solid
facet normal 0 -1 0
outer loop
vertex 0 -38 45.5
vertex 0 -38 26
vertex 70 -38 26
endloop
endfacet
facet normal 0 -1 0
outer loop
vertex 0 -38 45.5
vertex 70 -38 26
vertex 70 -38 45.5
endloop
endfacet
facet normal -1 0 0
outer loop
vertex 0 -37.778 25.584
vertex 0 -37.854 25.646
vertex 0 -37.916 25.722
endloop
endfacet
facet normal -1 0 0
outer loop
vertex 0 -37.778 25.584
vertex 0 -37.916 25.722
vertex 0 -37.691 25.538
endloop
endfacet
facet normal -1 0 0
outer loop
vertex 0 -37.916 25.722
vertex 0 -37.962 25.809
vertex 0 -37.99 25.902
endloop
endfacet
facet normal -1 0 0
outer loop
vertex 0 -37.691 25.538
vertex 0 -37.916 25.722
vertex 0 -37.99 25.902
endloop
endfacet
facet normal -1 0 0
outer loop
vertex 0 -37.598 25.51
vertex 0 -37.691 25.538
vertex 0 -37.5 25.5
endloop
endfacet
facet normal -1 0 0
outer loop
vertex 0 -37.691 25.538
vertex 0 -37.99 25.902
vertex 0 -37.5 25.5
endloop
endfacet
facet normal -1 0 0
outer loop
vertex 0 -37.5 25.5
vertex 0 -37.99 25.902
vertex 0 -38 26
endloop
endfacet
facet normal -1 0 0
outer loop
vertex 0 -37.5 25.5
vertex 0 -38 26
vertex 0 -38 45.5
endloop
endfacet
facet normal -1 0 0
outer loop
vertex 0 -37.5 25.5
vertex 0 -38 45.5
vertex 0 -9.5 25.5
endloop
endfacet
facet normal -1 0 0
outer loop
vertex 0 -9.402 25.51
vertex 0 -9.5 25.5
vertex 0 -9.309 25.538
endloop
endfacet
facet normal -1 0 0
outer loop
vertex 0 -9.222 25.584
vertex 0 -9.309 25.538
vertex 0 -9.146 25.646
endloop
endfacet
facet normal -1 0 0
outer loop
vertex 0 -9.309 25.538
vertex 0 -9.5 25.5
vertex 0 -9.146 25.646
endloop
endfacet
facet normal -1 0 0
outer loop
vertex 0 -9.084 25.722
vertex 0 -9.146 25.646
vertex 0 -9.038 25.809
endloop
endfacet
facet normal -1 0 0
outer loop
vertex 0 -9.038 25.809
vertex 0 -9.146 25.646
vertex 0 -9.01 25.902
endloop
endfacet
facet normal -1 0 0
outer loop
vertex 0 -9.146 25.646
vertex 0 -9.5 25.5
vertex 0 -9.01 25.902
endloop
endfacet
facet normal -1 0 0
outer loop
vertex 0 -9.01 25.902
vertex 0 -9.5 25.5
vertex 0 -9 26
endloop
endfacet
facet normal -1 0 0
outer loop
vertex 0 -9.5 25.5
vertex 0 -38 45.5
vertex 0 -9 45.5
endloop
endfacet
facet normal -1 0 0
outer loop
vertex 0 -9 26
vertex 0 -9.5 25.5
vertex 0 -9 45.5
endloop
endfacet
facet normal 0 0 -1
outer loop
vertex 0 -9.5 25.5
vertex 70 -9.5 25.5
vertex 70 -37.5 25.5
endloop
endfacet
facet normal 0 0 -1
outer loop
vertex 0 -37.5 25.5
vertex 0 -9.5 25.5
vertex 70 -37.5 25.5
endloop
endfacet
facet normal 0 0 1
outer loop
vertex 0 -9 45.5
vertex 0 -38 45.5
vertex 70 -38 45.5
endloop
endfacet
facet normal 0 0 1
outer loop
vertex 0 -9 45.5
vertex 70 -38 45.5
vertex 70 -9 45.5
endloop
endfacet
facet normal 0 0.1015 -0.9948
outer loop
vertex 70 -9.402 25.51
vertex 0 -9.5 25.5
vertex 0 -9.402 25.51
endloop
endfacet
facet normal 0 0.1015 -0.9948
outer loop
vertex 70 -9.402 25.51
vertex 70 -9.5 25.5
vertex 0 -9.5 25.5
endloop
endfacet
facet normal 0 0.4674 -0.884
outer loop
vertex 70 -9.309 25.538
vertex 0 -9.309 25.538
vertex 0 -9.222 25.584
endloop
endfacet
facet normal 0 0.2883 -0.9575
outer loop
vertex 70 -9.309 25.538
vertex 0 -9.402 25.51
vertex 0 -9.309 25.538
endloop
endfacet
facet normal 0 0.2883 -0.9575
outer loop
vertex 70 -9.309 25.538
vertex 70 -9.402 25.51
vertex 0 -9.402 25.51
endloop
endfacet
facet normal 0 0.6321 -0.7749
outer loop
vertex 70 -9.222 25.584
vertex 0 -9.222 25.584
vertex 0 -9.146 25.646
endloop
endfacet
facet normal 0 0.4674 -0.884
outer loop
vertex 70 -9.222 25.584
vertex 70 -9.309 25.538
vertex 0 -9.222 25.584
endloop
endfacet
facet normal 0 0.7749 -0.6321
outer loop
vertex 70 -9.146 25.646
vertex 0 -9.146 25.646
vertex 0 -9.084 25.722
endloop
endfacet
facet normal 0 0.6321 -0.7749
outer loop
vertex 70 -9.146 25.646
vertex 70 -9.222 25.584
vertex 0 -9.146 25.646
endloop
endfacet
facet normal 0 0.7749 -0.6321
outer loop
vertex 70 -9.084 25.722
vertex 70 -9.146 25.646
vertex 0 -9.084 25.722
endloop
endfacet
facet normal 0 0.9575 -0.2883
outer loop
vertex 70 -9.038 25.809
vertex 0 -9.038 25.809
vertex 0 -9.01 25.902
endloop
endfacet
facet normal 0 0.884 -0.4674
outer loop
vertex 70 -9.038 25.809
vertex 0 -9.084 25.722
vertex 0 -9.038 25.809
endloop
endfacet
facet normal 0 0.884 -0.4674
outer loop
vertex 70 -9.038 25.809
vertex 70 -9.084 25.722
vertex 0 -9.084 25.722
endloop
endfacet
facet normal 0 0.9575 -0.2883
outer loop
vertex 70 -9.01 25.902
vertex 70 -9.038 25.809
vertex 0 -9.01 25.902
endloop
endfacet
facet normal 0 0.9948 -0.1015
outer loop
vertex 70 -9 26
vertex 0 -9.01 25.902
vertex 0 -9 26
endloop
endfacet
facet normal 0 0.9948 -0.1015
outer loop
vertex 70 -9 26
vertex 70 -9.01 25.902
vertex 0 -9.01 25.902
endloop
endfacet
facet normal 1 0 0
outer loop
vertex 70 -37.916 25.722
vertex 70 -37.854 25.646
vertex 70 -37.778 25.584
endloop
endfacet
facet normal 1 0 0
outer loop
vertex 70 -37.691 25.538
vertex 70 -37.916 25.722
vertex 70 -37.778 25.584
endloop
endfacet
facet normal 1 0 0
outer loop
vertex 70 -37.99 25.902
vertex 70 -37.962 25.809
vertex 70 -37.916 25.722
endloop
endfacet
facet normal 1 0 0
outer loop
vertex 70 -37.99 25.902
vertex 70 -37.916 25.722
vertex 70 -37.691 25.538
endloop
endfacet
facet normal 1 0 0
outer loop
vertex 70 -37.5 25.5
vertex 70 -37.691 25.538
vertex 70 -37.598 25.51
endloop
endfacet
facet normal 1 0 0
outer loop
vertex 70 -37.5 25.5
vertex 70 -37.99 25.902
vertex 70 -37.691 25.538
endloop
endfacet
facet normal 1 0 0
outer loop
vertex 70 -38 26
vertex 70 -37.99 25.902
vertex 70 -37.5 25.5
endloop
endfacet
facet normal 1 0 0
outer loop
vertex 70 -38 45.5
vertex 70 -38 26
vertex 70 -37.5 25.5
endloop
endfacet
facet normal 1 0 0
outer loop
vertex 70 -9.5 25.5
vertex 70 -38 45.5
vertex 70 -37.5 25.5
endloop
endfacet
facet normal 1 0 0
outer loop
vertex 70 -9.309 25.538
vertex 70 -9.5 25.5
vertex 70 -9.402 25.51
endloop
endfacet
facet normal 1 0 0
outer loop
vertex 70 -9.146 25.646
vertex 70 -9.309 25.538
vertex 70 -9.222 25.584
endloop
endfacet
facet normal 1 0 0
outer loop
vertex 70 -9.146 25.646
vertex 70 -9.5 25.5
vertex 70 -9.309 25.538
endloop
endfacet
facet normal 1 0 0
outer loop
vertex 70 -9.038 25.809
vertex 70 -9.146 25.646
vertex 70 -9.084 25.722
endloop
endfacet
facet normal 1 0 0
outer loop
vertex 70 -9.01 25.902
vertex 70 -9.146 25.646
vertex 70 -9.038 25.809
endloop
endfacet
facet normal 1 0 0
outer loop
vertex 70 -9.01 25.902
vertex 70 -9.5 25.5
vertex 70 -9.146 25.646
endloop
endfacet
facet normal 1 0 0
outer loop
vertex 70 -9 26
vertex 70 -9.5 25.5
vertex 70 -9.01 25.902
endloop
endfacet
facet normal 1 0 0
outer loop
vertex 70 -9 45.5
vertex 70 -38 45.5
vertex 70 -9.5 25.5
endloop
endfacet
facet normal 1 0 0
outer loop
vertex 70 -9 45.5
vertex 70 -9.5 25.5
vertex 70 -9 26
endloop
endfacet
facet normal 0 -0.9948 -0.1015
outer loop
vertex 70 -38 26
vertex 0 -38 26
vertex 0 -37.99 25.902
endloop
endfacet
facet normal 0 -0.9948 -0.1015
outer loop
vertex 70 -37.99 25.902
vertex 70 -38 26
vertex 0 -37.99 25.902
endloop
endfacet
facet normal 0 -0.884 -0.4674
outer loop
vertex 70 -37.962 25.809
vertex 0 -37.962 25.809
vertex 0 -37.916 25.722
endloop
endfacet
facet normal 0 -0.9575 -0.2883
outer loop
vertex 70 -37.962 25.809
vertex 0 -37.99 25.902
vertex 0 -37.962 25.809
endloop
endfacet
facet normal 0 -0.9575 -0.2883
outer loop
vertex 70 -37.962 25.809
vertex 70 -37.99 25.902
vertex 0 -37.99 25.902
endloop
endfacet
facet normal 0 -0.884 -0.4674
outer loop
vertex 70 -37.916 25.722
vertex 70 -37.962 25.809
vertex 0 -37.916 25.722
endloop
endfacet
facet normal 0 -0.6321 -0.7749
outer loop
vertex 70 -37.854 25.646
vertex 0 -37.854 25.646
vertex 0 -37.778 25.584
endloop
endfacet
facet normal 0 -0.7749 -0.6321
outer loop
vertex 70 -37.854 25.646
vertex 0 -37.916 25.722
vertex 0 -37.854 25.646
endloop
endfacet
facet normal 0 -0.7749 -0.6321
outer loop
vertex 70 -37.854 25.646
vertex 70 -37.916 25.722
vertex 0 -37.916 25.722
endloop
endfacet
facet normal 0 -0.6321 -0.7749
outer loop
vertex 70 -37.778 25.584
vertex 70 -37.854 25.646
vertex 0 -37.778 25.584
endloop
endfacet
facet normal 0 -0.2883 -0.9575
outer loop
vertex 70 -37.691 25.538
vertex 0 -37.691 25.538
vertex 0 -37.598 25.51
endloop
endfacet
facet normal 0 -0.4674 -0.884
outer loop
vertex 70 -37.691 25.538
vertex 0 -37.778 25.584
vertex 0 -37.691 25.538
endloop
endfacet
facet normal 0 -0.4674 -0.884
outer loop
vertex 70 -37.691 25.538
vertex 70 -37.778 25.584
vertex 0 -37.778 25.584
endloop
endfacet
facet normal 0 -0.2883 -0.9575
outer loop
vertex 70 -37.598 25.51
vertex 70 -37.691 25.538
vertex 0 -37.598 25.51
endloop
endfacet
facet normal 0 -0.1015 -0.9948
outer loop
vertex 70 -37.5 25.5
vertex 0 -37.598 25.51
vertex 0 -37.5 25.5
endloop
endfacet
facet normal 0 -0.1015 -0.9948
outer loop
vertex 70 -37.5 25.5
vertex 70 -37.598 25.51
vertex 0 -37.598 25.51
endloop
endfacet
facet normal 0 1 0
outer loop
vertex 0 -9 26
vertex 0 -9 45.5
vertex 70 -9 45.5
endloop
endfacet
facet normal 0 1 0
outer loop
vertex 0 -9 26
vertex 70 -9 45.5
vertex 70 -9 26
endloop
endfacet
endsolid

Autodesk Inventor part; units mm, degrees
ref_plane "YZ Plane" through (0, 0, 0) normal (1, 0, 0) x (0, 1, 0)
ref_plane "XZ Plane" through (0, 0, 0) normal (0, 1, 0) x (-1, 0, 0)
ref_plane "XY Plane" through (0, 0, 0) normal (0, 0, 1) x (1, 0, 0)
sketch "Szkic1" plane through (0, 0, 0) normal (1, 0, 0) x (0, 1, 0)
  line L0 (-38, 45.5) -> (-9, 45.5)
  line L1 (-9, 45.5) -> (-9, 25.5)
  line L2 (-9, 25.5) -> (-38, 25.5)
  line L3 (-38, 25.5) -> (-38, 45.5)
  line L4 (-38, 45.5) -> (-9, 25.5) construction
  line L5 (-9, 45.5) -> (-38, 25.5) construction
  point P0 (0, 0)
  point P1 (-23.5, 35.5)
  dimension "d0" = 29
  dimension "d1" = 20
extrude "Wyciągnięcie proste1" add sketch "Szkic1" along normal blind 70
fillet "Zaokrąglenie1" radius 0.5 2 edges at (35, -38, 25.5) (35, -9, 25.5)
properties part number "wozek"
